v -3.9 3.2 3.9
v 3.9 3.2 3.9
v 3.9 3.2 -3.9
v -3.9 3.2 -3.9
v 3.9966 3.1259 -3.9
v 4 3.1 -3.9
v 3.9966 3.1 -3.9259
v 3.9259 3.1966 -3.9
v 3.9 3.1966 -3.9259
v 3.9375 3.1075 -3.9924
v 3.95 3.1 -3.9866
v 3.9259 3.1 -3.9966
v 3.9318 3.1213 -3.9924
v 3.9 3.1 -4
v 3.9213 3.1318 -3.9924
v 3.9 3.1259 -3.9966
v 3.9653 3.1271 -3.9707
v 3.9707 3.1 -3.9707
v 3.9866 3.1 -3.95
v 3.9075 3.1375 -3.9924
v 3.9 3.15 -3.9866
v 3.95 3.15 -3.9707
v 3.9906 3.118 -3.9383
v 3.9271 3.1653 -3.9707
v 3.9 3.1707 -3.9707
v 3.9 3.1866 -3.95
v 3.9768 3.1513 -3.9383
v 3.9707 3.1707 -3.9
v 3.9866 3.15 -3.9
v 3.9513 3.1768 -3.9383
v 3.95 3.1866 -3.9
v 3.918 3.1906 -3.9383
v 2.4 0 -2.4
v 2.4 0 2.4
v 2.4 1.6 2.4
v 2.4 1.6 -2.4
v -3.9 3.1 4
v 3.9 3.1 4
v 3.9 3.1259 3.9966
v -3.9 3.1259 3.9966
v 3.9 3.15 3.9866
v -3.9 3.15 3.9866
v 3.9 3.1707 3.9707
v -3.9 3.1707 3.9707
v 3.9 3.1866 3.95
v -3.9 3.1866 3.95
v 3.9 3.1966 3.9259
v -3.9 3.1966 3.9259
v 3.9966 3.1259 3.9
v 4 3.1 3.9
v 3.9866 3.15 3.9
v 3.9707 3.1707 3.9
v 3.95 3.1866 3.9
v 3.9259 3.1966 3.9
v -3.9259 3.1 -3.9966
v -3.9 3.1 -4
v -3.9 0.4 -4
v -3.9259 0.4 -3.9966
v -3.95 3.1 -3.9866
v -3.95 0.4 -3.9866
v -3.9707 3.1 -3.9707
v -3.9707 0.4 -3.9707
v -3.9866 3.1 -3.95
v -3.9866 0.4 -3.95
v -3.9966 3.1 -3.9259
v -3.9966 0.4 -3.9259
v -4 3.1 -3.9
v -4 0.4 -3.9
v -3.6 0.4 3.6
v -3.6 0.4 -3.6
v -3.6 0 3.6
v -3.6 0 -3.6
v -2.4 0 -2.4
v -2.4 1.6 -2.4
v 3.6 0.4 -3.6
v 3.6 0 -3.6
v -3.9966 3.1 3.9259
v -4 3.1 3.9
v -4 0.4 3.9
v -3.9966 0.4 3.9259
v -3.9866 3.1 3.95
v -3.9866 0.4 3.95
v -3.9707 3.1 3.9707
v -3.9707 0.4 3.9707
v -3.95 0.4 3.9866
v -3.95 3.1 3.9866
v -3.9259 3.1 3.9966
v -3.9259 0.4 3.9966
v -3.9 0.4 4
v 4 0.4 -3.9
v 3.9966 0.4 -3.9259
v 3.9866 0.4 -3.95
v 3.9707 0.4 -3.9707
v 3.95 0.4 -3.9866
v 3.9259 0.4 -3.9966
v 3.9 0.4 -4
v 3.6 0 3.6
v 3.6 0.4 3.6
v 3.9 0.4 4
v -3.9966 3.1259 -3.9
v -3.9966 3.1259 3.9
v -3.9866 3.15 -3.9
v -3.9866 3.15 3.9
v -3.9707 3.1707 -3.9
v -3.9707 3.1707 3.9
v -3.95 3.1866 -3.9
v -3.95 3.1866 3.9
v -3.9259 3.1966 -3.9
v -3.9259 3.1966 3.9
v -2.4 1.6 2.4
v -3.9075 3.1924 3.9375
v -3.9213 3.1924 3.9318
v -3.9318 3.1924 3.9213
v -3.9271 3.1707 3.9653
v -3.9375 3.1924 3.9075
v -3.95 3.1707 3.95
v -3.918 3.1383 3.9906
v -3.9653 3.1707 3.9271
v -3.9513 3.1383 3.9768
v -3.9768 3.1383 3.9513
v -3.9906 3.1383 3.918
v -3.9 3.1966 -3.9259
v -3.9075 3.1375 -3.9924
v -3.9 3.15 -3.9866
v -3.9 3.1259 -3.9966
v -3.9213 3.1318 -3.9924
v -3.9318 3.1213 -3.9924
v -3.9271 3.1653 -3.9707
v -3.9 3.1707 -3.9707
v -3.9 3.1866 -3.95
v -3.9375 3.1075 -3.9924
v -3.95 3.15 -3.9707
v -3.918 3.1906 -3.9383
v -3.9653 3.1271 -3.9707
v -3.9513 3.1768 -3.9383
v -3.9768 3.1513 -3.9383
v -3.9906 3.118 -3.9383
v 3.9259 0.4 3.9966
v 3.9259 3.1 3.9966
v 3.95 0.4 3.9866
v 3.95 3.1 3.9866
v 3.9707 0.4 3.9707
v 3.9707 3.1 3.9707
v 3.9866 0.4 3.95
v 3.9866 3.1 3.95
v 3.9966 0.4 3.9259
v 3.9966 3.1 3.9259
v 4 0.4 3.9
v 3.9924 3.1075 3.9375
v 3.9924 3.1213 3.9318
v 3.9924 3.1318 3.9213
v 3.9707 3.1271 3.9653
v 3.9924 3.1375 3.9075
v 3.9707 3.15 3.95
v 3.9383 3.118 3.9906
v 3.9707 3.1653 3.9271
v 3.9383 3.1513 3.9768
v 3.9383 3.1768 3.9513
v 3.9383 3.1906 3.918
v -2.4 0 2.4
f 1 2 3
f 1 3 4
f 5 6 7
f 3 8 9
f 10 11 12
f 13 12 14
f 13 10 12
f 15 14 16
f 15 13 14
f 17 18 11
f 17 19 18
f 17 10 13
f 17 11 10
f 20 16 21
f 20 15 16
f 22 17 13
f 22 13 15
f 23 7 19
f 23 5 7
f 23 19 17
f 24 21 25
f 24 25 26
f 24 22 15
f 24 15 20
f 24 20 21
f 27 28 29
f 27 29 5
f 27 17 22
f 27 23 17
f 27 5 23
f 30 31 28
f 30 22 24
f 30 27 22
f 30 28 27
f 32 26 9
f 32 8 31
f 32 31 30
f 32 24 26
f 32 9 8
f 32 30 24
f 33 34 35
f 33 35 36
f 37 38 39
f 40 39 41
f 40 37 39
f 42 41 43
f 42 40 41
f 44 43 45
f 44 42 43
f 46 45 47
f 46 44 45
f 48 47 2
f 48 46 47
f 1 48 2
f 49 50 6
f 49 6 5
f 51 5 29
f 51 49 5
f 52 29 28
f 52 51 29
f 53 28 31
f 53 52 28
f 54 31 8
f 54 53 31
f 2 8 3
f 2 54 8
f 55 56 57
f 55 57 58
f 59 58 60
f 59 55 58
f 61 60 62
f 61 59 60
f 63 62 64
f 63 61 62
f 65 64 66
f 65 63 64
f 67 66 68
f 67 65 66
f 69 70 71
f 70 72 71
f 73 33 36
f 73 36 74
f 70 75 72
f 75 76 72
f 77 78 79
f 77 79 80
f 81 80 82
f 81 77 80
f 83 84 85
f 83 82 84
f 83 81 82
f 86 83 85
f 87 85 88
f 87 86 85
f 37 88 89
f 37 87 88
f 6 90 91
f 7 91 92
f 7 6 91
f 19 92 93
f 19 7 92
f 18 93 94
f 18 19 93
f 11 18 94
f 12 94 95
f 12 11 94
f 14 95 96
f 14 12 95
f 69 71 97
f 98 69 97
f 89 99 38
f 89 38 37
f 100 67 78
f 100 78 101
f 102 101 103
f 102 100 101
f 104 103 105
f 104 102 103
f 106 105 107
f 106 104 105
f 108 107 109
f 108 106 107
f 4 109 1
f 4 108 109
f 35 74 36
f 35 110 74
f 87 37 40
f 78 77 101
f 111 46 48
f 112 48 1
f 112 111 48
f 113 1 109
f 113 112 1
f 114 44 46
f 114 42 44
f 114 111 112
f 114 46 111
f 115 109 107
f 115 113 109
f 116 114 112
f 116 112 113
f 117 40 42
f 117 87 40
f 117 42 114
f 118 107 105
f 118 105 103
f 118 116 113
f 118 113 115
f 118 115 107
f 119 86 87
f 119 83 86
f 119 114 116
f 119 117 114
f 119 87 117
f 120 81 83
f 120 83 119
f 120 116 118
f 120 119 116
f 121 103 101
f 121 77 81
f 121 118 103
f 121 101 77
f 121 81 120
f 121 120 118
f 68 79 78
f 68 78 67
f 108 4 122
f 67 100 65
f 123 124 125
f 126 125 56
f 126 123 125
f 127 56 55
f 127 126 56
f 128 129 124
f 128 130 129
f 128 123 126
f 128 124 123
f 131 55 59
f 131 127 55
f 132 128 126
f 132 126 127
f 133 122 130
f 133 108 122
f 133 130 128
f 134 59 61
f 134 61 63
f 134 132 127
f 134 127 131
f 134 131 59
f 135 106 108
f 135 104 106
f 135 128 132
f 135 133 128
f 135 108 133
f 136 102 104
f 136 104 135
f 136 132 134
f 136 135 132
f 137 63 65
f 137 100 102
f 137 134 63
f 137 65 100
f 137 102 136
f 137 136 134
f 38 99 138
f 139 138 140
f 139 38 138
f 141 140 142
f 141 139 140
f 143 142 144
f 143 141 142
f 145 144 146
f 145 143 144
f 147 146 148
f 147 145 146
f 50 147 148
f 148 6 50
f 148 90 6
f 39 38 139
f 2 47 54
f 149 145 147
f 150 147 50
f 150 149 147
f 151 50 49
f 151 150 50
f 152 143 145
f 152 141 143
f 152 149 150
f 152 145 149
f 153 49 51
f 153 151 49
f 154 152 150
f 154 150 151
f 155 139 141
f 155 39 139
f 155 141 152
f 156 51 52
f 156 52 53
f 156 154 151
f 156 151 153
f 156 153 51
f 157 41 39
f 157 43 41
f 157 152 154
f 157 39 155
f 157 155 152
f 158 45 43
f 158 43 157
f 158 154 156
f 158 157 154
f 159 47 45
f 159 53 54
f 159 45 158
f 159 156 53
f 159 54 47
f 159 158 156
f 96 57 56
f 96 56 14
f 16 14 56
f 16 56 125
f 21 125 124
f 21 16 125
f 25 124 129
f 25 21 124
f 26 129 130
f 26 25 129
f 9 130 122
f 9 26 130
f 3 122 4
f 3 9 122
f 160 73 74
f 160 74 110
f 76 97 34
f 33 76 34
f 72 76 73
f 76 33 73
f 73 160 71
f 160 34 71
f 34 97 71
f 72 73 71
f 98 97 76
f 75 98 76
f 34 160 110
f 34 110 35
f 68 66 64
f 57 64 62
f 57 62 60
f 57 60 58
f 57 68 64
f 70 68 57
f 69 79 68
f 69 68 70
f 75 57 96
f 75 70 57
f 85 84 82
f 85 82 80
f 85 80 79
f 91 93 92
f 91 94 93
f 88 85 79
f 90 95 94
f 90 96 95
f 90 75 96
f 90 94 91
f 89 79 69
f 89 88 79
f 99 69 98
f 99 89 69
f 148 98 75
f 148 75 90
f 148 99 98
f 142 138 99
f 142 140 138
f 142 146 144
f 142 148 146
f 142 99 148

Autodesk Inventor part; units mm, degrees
ref_plane "YZ Plane" through (0, 0, 0) normal (1, 0, 0) x (0, 1, 0)
ref_plane "XZ Plane" through (0, 0, 0) normal (0, 1, 0) x (-1, 0, 0)
ref_plane "XY Plane" through (0, 0, 0) normal (0, 0, 1) x (1, 0, 0)
sketch "Sketch2" plane through (0, 0, 0) normal (0, 1, 0) x (-1, 0, 0)
  line L0 (-4, 4) -> (4, 4)
  line L1 (4, 4) -> (4, -4)
  line L2 (4, -4) -> (-4, -4)
  line L3 (-4, -4) -> (-4, 4)
  point P0 (0, 0)
  point P1 (0, 4)
  point P2 (-4, 0)
  dimension "d0" = 8
  dimension "d1" = 8
extrude "Extrusion1" add sketch "Sketch2" along normal blind 3.2
sketch "Sketch3" plane through (0, 0, 0) normal (0, -1, 0) x (1, 0, 0)
  line L0 (4, 4) -> (-4, 4) projected
  line L1 (-4, 4) -> (-4, -4) projected
  line L2 (-2.4, 2.4) -> (2.4, 2.4)
  line L3 (2.4, 2.4) -> (2.4, -2.4)
  line L4 (2.4, -2.4) -> (-2.4, -2.4)
  line L5 (-2.4, -2.4) -> (-2.4, 2.4)
  line L6 (-4, -4) -> (4, -4) projected
  line L7 (4, -4) -> (4, 4) projected
  line L8 (-3.6, 3.6) -> (3.6, 3.6)
  line L9 (3.6, 3.6) -> (3.6, -3.6)
  line L10 (3.6, -3.6) -> (-3.6, -3.6)
  line L11 (-3.6, -3.6) -> (-3.6, 3.6)
  point P0 (0, 0)
  point P1 (-2.4, 0)
  point P2 (0, 2.4)
  point P3 (0, 0)
  point P4 (-3.6, 0)
  point P5 (0, 3.6)
  dimension "d8" = 1.6
  dimension "d62" = 1.6
  dimension "d98" = 0.4
  dimension "d99" = 0.4
extrude "Extrusion2" cut sketch "Sketch3" against normal blind 1.6 contours L2 L3 L4 L5
extrude "Extrusion7" cut sketch "Sketch3" against normal blind 0.4 contours L7 L6 L1 L0
fillet "Fillet1" radius 0.1 8 edges at (-4, 1.8, 4) (0, 3.2, 4) (-4, 3.2, 0) (4, 1.8, 4) (4, 3.2, 0) (0, 3.2, -4) (4, 1.8, -4) (-4, 1.8, -4)
equation "\"d4\" = 0.333333 * lh"
equation "\"d8\" = d62"
equation "\"d62\" = wall"
equation "\"d98\" = gw"
equation "\"d99\" = d98"
equation "\"d11\" = 0.333333 * lh - topthk"
equation "\"d100\" = gh"
equation "\"d22\" = lf"
equation "\"lh\" = 9.6"
equation "\"wall\" = 1.6"
equation "\"gw\" = 0.4"
equation "\"topthk\" = 1.6"
equation "\"gh\" = 0.4"
equation "\"lf\" = 0.1"
properties part number "3070b-DkBluishGray" material "ABS Plastic"
